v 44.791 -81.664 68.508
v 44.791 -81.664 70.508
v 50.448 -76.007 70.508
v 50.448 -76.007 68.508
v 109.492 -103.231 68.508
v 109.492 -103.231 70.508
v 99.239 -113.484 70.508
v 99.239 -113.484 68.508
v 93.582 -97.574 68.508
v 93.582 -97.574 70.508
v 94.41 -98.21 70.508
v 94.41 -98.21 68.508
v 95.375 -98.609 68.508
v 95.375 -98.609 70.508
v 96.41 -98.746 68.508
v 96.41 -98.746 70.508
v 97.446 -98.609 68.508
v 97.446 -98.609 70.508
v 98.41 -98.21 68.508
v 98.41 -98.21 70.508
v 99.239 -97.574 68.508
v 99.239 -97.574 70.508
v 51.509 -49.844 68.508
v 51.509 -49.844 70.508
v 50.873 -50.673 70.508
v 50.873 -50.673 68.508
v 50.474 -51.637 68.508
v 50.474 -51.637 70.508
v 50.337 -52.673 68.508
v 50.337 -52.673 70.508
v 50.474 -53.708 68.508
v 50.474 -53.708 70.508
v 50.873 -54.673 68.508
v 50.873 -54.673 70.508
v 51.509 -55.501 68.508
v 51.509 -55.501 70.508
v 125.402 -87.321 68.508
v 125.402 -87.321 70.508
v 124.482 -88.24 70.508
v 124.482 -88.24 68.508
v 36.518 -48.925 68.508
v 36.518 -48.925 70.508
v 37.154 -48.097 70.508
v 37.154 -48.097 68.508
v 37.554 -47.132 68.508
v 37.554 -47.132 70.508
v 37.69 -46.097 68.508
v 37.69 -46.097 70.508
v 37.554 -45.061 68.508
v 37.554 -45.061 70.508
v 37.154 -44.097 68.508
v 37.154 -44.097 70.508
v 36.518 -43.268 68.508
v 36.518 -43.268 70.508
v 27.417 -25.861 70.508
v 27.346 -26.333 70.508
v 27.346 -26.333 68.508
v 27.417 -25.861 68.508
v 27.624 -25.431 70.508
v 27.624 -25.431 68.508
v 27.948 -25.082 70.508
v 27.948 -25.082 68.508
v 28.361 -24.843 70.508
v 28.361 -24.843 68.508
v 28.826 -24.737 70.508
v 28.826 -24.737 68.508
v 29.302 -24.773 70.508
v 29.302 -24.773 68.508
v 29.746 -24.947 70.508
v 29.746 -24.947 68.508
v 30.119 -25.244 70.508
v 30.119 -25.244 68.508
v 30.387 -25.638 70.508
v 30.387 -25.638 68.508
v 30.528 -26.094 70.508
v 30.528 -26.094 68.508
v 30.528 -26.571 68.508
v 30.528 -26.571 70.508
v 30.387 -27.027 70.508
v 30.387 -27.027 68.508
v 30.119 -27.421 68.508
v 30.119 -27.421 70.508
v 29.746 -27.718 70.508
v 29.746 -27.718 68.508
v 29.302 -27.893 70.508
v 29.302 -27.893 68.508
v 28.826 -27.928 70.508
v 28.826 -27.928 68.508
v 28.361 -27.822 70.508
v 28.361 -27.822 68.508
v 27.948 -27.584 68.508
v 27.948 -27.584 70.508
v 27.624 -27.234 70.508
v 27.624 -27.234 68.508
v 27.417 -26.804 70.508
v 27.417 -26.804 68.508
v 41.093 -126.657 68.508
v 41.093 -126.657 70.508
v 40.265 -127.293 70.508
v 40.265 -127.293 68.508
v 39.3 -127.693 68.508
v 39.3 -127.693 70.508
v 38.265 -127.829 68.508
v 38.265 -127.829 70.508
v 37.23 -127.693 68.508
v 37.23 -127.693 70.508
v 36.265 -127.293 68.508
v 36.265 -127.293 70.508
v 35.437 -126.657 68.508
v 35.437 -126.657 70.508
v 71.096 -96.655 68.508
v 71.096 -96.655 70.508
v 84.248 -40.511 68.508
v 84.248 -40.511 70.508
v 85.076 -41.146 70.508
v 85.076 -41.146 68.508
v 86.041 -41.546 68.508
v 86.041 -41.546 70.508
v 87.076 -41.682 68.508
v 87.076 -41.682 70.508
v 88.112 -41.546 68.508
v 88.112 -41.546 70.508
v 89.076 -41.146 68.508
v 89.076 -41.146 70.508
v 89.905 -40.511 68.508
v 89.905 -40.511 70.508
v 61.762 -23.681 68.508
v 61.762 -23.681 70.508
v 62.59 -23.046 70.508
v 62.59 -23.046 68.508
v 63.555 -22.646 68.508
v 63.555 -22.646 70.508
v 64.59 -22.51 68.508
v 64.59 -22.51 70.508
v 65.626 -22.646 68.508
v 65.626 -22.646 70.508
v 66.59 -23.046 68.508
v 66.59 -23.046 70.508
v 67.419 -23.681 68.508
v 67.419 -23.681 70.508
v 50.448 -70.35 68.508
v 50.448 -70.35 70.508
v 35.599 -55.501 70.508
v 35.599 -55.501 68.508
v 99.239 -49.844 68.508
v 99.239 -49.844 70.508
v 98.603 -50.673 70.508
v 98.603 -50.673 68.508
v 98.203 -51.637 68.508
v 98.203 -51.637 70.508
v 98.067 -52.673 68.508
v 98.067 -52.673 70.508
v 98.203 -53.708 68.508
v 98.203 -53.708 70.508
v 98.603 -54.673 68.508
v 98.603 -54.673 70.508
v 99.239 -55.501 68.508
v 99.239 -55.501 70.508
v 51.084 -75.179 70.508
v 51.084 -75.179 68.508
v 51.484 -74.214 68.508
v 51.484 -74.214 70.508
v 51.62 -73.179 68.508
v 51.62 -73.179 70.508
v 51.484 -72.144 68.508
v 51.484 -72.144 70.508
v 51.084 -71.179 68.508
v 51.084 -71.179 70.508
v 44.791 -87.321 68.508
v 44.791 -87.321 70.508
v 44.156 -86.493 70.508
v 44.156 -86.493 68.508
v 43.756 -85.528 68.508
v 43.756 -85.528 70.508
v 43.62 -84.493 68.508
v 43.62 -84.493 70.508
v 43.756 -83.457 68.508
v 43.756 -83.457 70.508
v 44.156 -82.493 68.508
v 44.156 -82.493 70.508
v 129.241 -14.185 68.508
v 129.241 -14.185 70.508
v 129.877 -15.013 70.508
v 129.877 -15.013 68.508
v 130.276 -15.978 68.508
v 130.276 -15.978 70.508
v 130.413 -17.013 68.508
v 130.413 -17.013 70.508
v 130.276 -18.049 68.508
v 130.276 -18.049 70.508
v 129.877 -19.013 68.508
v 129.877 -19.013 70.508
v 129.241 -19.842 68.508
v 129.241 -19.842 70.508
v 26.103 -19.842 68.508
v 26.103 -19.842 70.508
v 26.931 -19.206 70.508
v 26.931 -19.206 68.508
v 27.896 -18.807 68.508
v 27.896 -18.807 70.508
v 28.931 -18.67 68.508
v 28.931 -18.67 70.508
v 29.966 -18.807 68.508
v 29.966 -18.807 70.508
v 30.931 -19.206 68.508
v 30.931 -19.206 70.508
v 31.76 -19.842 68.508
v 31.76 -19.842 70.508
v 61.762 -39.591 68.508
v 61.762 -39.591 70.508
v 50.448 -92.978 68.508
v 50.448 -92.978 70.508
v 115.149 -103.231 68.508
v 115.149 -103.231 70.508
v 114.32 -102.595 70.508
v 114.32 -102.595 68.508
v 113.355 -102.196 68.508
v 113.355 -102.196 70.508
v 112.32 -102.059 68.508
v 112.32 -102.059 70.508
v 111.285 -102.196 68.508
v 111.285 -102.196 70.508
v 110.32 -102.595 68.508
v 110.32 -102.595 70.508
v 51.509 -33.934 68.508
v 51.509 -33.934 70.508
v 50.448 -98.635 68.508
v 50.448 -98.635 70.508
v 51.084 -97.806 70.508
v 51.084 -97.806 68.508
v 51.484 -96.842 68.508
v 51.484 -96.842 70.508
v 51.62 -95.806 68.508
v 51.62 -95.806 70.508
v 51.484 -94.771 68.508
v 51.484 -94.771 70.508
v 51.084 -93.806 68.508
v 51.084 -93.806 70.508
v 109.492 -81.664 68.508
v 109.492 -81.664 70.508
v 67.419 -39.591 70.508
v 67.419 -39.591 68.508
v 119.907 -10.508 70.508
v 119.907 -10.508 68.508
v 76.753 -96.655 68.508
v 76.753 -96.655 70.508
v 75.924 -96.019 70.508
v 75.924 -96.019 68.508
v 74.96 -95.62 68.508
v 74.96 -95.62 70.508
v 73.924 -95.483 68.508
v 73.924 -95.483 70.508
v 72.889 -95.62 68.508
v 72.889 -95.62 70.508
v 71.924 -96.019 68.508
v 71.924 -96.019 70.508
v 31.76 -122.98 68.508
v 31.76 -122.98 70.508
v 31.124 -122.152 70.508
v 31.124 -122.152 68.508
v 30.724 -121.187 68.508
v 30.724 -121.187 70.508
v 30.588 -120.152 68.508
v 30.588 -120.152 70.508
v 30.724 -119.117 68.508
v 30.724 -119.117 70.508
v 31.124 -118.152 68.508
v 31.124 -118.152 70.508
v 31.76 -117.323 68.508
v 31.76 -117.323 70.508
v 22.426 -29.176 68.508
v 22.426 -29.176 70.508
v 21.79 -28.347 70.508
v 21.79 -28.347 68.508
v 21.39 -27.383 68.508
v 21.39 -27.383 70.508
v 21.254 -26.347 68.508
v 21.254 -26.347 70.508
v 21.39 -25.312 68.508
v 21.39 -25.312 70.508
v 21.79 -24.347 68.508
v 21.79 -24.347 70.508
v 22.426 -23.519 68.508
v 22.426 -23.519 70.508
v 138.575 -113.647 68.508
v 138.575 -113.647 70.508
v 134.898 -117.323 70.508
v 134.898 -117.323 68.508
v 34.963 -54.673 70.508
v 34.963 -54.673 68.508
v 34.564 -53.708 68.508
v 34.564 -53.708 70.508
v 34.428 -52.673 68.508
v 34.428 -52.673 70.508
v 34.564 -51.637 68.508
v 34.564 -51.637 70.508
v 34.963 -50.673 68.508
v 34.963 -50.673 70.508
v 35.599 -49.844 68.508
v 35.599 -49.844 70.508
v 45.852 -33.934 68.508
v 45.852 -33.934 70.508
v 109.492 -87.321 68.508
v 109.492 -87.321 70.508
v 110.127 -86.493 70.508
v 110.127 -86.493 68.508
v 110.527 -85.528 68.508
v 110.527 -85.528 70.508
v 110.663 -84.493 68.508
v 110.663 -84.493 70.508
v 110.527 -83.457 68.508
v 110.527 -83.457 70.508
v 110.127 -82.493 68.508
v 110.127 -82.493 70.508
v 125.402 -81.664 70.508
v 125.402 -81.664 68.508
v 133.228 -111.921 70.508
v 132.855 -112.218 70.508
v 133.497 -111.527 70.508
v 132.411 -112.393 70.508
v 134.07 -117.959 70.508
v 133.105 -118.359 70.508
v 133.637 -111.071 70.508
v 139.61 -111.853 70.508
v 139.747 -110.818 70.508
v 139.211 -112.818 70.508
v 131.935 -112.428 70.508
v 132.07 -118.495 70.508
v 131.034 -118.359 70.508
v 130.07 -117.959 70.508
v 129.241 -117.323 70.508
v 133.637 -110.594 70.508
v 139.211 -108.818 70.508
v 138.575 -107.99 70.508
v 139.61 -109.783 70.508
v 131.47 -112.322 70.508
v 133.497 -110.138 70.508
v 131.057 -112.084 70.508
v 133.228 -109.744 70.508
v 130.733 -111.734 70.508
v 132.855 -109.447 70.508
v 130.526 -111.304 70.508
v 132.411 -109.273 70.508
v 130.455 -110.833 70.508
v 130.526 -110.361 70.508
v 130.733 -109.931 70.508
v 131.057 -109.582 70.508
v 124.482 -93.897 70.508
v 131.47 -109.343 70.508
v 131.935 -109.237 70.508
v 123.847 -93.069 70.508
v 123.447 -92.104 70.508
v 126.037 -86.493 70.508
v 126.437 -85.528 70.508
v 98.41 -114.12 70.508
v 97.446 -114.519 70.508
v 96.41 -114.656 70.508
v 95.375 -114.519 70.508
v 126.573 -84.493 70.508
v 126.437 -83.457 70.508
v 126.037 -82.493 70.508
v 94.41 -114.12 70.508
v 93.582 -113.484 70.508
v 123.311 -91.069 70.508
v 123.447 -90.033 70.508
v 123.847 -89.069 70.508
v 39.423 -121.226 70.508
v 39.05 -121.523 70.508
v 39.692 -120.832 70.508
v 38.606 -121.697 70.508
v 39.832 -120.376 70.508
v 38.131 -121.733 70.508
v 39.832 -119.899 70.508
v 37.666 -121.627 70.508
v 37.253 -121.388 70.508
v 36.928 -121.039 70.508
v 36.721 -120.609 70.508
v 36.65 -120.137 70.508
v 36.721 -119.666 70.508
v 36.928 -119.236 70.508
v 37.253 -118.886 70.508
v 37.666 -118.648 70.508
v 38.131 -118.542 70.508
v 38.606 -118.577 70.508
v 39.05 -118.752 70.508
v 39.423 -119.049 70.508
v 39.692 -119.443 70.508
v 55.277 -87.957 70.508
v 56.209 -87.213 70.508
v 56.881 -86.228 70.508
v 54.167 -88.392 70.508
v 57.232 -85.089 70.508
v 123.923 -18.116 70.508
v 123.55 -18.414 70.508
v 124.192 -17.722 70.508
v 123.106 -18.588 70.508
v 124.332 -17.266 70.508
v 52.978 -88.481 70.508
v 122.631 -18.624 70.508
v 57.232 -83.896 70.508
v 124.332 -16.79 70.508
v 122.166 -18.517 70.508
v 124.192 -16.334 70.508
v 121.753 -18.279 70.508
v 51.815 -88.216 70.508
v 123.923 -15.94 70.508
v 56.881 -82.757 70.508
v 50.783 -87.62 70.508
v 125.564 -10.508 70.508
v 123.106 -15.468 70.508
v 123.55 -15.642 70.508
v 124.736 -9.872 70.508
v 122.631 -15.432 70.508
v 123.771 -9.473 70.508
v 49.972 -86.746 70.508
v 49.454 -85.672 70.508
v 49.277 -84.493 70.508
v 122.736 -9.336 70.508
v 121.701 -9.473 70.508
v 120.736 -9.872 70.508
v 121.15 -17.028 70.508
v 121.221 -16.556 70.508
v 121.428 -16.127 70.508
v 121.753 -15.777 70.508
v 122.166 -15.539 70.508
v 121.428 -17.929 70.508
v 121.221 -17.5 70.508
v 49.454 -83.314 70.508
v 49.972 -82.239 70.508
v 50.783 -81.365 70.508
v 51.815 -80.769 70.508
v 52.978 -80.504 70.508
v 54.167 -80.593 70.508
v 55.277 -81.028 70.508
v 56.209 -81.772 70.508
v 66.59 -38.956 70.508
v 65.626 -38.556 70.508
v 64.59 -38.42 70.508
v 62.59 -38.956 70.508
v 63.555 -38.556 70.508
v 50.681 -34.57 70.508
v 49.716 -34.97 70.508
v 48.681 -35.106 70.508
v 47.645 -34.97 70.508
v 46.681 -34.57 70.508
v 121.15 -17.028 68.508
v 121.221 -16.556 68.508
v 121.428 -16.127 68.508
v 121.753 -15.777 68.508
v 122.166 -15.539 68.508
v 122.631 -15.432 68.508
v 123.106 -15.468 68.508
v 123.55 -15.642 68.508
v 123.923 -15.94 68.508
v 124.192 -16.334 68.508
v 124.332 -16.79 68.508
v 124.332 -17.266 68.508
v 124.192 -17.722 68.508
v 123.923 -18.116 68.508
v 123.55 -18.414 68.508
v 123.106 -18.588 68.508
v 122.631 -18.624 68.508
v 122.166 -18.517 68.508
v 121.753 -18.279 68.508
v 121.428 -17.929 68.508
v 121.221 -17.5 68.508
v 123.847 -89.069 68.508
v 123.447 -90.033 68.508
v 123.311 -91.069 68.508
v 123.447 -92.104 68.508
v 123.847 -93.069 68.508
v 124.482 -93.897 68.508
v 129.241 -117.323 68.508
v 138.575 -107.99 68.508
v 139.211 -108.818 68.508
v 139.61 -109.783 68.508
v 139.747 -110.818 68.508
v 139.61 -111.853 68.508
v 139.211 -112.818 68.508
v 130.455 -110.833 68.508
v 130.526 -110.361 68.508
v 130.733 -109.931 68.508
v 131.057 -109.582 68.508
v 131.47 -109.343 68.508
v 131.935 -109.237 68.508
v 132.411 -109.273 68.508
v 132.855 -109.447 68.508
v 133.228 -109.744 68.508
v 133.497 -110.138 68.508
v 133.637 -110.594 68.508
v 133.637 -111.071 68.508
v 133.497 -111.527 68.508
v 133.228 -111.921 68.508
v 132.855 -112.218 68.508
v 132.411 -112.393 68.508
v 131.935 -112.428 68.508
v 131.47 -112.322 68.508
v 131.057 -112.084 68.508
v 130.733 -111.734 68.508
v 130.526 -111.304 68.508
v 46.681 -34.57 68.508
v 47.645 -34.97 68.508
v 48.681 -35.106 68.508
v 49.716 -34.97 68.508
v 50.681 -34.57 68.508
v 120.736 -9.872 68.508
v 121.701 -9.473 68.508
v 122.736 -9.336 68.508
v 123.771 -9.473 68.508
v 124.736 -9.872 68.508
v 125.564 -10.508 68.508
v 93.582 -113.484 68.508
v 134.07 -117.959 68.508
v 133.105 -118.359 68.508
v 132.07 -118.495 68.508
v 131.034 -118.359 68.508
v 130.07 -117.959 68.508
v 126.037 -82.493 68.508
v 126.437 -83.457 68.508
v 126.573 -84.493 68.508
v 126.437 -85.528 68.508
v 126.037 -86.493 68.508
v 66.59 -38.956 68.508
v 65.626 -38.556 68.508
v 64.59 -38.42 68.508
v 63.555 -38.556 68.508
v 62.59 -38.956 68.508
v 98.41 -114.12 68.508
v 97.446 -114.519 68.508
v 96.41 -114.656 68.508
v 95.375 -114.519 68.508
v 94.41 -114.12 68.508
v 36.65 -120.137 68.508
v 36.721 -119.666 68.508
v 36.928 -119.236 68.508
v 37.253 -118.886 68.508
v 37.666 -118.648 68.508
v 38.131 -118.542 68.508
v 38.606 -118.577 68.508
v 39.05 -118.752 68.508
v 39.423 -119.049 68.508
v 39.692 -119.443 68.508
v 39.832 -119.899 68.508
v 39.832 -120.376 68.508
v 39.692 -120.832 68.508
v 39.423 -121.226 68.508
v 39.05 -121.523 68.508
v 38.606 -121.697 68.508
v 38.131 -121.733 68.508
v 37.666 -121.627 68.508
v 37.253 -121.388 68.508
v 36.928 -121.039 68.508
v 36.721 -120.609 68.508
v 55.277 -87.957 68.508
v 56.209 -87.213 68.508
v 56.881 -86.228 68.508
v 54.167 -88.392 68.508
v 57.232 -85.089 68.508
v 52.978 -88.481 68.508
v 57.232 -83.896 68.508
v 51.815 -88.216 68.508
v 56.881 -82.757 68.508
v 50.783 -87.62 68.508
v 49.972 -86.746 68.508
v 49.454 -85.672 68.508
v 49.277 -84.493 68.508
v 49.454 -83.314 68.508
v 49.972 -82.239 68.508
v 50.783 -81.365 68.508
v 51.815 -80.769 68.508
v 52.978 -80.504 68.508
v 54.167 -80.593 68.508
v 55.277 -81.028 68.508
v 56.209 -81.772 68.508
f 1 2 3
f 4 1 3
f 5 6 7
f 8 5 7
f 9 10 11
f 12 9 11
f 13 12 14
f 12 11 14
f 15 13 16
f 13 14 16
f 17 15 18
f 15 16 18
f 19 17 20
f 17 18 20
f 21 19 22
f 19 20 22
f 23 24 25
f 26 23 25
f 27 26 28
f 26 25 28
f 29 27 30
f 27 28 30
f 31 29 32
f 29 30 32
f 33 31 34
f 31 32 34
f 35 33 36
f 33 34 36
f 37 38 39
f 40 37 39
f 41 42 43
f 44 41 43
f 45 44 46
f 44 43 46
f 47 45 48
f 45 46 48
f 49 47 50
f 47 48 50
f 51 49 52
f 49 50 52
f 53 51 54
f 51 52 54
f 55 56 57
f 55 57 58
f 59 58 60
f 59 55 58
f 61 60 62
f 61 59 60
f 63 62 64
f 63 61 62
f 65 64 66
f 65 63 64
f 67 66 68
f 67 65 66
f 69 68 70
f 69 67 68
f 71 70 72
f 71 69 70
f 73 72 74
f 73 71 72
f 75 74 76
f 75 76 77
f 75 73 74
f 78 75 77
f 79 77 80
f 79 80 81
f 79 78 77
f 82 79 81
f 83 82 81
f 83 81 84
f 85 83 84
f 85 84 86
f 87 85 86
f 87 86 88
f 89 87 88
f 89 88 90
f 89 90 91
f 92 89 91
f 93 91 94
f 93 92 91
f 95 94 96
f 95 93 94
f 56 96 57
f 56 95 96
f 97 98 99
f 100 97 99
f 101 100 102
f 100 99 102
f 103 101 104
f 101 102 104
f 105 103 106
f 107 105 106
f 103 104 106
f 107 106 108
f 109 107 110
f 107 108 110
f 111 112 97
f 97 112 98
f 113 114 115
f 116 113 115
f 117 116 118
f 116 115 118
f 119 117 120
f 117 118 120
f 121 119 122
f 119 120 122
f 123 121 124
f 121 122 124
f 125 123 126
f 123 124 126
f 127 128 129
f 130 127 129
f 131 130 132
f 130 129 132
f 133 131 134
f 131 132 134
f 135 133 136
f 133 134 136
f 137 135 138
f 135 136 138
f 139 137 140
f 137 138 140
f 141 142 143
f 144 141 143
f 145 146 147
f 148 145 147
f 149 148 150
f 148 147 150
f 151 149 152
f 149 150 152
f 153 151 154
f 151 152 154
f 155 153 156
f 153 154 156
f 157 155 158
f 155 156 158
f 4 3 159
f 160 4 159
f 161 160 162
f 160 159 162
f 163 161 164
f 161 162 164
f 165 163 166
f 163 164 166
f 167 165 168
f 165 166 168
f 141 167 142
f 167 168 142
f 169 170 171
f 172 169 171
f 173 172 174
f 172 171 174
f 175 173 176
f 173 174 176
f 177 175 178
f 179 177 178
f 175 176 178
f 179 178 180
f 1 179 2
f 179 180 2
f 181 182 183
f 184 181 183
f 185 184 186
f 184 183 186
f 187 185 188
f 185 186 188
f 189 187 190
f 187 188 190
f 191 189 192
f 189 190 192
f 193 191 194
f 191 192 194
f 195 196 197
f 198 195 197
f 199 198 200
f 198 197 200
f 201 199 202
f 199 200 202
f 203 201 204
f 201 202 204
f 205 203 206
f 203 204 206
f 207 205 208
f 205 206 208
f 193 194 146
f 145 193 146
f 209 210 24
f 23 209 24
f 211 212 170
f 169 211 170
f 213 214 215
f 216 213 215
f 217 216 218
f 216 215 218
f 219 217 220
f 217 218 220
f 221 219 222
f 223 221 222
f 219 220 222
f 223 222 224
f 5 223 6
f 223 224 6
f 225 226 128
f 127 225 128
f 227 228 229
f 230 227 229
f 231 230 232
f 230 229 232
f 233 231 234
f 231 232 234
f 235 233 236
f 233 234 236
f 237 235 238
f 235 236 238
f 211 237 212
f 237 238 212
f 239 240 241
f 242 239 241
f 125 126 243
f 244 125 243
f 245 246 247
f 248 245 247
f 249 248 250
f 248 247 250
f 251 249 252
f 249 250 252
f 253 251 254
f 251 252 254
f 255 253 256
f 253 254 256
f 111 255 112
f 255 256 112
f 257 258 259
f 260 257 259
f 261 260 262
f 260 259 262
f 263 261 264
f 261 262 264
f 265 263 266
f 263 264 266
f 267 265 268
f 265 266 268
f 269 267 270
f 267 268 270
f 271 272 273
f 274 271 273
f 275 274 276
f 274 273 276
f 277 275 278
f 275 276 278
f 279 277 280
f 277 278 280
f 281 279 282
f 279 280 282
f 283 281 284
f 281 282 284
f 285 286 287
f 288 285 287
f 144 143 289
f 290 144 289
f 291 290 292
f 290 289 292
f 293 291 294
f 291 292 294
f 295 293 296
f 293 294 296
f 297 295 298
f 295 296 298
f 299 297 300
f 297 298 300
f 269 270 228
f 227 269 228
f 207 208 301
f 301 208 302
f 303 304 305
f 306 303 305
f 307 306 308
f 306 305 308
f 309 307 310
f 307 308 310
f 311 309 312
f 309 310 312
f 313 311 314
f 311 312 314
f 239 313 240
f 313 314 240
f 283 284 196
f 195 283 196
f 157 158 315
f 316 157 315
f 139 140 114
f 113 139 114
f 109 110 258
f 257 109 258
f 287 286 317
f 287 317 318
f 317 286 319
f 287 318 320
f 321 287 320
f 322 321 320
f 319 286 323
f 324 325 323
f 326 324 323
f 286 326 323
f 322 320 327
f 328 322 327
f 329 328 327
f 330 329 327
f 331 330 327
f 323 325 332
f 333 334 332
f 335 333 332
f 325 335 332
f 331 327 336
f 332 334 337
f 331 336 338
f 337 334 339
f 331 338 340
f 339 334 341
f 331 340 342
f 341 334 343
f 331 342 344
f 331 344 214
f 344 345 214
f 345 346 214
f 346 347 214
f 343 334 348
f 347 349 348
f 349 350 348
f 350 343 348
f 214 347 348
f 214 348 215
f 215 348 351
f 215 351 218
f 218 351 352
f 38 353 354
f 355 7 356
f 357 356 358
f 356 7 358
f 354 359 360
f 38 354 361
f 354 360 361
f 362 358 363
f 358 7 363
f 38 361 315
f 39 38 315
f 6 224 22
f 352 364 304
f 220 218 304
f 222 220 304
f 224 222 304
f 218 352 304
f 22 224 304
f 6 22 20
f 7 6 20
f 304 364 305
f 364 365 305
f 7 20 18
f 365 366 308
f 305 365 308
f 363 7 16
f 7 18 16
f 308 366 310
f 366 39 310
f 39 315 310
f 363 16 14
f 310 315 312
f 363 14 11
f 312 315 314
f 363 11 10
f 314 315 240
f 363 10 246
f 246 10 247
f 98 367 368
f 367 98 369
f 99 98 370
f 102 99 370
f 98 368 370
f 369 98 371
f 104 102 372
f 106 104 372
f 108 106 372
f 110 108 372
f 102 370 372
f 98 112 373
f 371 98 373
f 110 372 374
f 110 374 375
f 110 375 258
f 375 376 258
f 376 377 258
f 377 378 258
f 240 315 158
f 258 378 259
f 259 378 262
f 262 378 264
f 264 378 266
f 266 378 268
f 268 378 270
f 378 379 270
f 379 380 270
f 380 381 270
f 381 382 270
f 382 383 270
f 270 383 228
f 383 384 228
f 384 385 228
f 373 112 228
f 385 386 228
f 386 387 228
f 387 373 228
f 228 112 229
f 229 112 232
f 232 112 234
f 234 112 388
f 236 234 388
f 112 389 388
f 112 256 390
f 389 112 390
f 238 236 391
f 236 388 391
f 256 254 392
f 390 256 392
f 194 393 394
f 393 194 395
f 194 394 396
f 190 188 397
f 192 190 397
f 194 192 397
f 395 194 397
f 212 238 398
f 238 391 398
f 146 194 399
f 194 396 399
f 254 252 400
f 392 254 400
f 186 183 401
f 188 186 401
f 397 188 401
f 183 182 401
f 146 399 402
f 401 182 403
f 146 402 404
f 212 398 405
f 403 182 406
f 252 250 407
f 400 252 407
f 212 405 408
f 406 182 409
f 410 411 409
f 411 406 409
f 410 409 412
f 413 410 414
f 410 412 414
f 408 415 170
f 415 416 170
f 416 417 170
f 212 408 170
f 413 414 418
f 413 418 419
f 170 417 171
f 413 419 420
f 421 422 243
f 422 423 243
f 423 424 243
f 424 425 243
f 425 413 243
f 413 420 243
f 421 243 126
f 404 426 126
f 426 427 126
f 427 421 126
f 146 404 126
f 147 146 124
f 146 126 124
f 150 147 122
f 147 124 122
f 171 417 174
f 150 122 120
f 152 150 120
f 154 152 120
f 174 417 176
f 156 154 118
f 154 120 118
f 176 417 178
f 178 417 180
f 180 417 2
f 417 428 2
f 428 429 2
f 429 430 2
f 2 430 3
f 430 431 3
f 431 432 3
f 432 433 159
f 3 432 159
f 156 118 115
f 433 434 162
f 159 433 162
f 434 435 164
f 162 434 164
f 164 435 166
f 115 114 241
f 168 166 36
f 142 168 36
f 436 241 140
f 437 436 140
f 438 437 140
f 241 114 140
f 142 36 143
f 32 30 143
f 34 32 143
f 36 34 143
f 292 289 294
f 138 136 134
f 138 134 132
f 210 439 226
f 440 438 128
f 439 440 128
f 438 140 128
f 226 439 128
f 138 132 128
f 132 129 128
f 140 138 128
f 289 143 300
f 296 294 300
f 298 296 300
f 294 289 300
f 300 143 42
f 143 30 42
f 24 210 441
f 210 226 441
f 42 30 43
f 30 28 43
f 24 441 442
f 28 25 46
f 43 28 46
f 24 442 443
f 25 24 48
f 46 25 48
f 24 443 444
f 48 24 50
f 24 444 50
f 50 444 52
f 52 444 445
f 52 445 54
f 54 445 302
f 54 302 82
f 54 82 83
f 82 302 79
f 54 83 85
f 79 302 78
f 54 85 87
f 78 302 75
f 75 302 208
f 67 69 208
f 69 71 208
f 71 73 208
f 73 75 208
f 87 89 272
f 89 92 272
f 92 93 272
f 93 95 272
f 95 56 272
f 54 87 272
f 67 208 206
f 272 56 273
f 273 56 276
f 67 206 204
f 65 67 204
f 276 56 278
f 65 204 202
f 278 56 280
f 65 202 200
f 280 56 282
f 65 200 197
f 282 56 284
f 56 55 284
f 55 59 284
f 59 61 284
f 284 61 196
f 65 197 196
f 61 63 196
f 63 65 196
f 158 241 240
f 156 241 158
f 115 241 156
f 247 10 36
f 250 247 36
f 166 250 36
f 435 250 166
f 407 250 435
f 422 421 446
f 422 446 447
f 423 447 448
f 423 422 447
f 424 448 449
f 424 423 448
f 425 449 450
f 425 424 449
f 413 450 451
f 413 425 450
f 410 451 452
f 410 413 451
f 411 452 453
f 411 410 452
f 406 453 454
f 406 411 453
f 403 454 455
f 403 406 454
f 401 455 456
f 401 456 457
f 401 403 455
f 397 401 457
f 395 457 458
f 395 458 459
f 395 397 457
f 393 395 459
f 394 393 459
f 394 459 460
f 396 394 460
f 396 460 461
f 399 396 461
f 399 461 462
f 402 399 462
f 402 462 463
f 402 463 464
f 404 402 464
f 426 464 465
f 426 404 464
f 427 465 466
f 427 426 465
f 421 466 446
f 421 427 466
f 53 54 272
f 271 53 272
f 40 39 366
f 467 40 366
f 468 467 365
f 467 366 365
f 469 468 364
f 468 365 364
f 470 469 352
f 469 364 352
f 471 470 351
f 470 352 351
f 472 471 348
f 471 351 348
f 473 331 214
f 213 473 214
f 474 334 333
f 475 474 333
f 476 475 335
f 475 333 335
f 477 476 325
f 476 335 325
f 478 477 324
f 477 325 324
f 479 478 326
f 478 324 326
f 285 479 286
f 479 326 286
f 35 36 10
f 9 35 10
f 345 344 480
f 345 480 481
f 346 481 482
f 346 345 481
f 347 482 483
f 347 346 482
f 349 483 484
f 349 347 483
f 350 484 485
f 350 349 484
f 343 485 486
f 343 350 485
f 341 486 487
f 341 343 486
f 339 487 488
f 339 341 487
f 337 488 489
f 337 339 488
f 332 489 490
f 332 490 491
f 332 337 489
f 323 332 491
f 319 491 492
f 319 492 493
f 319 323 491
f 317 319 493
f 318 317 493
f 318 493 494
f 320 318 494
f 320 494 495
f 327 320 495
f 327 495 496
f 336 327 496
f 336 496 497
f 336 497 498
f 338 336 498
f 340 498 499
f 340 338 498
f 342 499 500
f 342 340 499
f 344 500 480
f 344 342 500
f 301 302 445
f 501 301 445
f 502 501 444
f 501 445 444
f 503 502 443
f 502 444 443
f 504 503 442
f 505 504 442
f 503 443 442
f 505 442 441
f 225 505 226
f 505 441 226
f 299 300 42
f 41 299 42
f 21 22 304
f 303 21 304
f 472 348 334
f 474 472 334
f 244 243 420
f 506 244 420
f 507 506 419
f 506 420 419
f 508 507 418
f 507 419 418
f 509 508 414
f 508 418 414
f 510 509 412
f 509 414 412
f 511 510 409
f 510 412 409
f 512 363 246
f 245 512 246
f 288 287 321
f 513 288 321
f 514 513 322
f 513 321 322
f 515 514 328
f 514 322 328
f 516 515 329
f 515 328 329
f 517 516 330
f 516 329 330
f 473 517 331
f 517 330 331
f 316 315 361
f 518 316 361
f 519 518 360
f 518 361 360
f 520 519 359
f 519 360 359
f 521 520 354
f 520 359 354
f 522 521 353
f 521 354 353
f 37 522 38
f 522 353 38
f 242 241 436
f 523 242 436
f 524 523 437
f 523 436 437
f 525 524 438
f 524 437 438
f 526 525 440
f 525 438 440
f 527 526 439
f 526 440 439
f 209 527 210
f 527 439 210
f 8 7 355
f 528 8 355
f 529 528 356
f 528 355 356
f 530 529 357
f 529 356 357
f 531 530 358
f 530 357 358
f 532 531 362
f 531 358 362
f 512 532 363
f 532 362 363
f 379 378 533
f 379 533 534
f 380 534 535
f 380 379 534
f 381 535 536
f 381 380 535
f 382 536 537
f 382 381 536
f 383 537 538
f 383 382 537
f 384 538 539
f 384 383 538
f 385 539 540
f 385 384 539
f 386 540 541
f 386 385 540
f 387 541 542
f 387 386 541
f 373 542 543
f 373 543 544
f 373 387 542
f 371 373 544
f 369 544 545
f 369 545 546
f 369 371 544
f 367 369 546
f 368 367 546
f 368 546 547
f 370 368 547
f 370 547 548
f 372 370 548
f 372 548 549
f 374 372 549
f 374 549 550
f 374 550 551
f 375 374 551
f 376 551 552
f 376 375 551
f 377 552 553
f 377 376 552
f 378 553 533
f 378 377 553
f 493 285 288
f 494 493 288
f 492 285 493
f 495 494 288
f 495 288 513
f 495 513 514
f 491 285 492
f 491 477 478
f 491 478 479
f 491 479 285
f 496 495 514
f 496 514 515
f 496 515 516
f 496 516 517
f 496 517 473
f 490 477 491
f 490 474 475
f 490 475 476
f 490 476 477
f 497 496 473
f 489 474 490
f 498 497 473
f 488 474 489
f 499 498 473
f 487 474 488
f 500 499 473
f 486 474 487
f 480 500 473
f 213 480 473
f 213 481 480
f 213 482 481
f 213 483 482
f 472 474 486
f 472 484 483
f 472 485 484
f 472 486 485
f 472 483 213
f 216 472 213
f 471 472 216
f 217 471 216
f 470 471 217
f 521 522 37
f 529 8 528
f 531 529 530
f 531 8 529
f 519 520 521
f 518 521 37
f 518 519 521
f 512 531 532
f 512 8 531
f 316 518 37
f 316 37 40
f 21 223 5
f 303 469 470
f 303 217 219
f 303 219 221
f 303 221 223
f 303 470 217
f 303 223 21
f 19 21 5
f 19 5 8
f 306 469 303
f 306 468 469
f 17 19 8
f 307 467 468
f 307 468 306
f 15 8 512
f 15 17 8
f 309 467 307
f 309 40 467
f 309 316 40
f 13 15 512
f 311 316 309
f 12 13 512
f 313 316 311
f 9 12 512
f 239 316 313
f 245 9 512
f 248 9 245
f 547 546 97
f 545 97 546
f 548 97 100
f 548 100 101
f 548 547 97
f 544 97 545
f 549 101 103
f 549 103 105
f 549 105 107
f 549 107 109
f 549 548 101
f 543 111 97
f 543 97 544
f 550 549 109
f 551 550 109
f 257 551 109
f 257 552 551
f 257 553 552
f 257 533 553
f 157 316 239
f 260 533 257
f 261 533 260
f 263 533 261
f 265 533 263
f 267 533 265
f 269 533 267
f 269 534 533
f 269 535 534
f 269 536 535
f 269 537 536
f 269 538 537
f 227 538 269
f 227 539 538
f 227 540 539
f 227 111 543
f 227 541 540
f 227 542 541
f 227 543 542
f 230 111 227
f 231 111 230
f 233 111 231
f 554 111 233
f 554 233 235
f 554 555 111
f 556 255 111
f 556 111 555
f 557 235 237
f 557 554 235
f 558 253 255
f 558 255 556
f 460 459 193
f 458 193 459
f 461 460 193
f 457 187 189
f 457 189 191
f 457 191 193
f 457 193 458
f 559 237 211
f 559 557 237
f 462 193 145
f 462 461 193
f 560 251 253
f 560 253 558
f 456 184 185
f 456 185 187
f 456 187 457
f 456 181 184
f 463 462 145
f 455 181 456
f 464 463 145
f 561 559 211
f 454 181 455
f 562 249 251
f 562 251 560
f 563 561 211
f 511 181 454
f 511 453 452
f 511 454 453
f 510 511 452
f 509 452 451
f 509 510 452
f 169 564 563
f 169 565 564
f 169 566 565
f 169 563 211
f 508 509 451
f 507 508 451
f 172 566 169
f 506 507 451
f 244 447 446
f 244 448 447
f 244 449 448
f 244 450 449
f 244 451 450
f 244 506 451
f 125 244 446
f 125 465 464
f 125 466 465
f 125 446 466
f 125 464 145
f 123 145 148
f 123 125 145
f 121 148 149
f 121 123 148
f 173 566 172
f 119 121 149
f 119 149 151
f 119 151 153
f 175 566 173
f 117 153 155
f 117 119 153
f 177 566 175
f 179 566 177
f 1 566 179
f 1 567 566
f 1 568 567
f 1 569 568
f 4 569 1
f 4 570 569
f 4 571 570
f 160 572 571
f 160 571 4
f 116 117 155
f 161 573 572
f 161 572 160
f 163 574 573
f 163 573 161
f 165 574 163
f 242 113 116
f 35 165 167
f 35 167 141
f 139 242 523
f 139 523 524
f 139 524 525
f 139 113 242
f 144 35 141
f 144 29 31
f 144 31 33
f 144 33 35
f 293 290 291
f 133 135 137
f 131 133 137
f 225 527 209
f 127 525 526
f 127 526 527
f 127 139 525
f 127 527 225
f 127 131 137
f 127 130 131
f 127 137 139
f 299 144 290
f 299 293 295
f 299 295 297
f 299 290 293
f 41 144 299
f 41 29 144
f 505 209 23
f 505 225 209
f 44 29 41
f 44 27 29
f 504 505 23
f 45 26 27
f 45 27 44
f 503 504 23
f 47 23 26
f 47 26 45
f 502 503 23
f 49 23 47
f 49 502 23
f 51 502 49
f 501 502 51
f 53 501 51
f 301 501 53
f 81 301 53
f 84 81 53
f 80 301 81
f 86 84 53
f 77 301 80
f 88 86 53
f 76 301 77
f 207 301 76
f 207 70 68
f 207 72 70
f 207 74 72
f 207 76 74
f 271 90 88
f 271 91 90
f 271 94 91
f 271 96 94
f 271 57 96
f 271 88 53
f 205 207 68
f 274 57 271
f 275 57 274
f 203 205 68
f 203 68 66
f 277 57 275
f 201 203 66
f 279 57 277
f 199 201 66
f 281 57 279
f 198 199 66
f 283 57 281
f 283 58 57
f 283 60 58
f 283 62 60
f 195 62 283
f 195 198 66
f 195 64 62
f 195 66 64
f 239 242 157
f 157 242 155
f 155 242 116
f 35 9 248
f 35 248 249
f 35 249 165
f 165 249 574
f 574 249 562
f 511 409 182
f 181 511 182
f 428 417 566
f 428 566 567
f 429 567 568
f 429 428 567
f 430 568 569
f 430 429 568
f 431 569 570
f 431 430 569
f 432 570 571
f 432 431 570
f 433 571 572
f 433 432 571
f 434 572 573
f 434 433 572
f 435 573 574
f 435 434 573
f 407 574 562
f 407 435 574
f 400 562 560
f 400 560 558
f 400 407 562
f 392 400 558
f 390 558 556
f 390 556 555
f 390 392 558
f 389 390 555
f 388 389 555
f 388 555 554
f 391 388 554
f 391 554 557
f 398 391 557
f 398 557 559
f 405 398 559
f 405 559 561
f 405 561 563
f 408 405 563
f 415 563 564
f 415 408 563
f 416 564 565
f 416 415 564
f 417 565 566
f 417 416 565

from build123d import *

# Parameters (mm, degrees)
SKETCH2_R           = 1.6
SKETCH2_R_2         = 4
BOSS_EXTRUDE1_DEPTH = 2


with BuildPart() as part:
    # Sketch2 → Boss-Extrude1 (new body)
    with BuildSketch(Plane(origin=(0, 0, 70.507785861), x_dir=(-1, 0, 0), z_dir=(0, 0, -1))):
        with BuildLine():
            Line((-93.581832429, -113.483945735), (-76.752691037, -96.654804343))
            ThreePointArc((-76.752691037, -96.654804343), (-73.924263912, -95.483231467), (-71.095836788, -96.654804343))
            Line((-71.095836788, -96.654804343), (-41.093354786, -126.657286344))
            ThreePointArc((-41.093354786, -126.657286344), (-38.264927661, -127.828859219), (-35.436500537, -126.657286344))
            Line((-35.436500537, -126.657286344), (-31.759545275, -122.980331082))
            ThreePointArc((-31.759545275, -122.980331082), (-30.587972399, -120.151903957), (-31.759545275, -117.323476832))
            Line((-31.759545275, -117.323476832), (-50.448318777, -98.63470333))
            ThreePointArc((-50.448318777, -98.63470333), (-51.619891652, -95.806276205), (-50.448318777, -92.97784908))
            Line((-50.448318777, -92.97784908), (-44.791464528, -87.320994831))
            ThreePointArc((-44.791464528, -87.320994831), (-43.619891652, -84.492567706), (-44.791464528, -81.664140581))
            Line((-44.791464528, -81.664140581), (-50.448318777, -76.007286332))
            ThreePointArc((-50.448318777, -76.007286332), (-51.619891652, -73.178859207), (-50.448318777, -70.350432082))
            Line((-50.448318777, -70.350432082), (-35.599076372, -55.501189677))
            ThreePointArc((-35.599076372, -55.501189677), (-34.427503497, -52.672762553), (-35.599076372, -49.844335428))
            Line((-35.599076372, -49.844335428), (-36.518315188, -48.925096612))
            ThreePointArc((-36.518315188, -48.925096612), (-37.689888063, -46.096669488), (-36.518315188, -43.268242363))
            Line((-36.518315188, -43.268242363), (-22.425735763, -29.175662938))
            ThreePointArc((-22.425735763, -29.175662938), (-21.254162888, -26.347235813), (-22.425735763, -23.518808689))
            Line((-22.425735763, -23.518808689), (-26.102691025, -19.841853427))
            ThreePointArc((-26.102691025, -19.841853427), (-28.93111815, -18.670280551), (-31.759545275, -19.841853427))
            Line((-31.759545275, -19.841853427), (-45.852124699, -33.934432851))
            ThreePointArc((-45.852124699, -33.934432851), (-48.680551824, -35.106005727), (-51.508978949, -33.934432851))
            Line((-51.508978949, -33.934432851), (-61.762027276, -23.681384524))
            ThreePointArc((-61.762027276, -23.681384524), (-64.590454401, -22.509811649), (-67.418881525, -23.681384524))
            Line((-67.418881525, -23.681384524), (-84.248022918, -40.510525916))
            ThreePointArc((-84.248022918, -40.510525916), (-87.076450042, -41.682098792), (-89.904877167, -40.510525916))
            Line((-89.904877167, -40.510525916), (-119.907359169, -10.508043915))
            ThreePointArc((-119.907359169, -10.508043915), (-122.735786293, -9.33647104), (-125.564213418, -10.508043915))
            Line((-125.564213418, -10.508043915), (-129.24116868, -14.184999177))
            ThreePointArc((-129.24116868, -14.184999177), (-130.412741556, -17.013426302), (-129.24116868, -19.841853427))
            Line((-129.24116868, -19.841853427), (-99.238686679, -49.844335428))
            ThreePointArc((-99.238686679, -49.844335428), (-98.067113804, -52.672762553), (-99.238686679, -55.501189677))
            Line((-99.238686679, -55.501189677), (-125.401637583, -81.664140581))
            ThreePointArc((-125.401637583, -81.664140581), (-126.573210458, -84.492567706), (-125.401637583, -87.320994831))
            Line((-125.401637583, -87.320994831), (-124.482398767, -88.240233646))
            ThreePointArc((-124.482398767, -88.240233646), (-123.310825892, -91.068660771), (-124.482398767, -93.897087896))
            Line((-124.482398767, -93.897087896), (-138.574978192, -107.989667321))
            ThreePointArc((-138.574978192, -107.989667321), (-139.746551067, -110.818094445), (-138.574978192, -113.64652157))
            Line((-138.574978192, -113.64652157), (-134.89802293, -117.323476832))
            ThreePointArc((-134.89802293, -117.323476832), (-132.069595805, -118.495049708), (-129.24116868, -117.323476832))
            Line((-129.24116868, -117.323476832), (-115.148589256, -103.230897408))
            ThreePointArc((-115.148589256, -103.230897408), (-112.320162131, -102.059324532), (-109.491735006, -103.230897408))
            Line((-109.491735006, -103.230897408), (-99.238686679, -113.483945735))
            ThreePointArc((-99.238686679, -113.483945735), (-96.410259554, -114.65551861), (-93.581832429, -113.483945735))
        make_face()
        with Locations((-132.055025121, -110.832665129)):
            Circle(SKETCH2_R, mode=Mode.SUBTRACT)
        with Locations((-28.945688834, -26.332665129)):
            Circle(SKETCH2_R, mode=Mode.SUBTRACT)
        with Locations((-122.750356977, -17.027996986)):
            Circle(SKETCH2_R, mode=Mode.SUBTRACT)
        with Locations((-38.250356977, -120.137333273)):
            Circle(SKETCH2_R, mode=Mode.SUBTRACT)
        with Locations((-53.276745902, -84.492567706)):
            Circle(SKETCH2_R_2, mode=Mode.SUBTRACT)
        with BuildLine():
            Line((-109.491735006, -81.664140581), (-67.418881525, -39.591287101))
            ThreePointArc((-67.418881525, -39.591287101), (-64.590454401, -38.419714226), (-61.762027276, -39.591287101))
            Line((-61.762027276, -39.591287101), (-51.508978949, -49.844335428))
            ThreePointArc((-51.508978949, -49.844335428), (-50.337406074, -52.672762553), (-51.508978949, -55.501189677))
            Line((-51.508978949, -55.501189677), (-93.581832429, -97.574043158))
            ThreePointArc((-93.581832429, -97.574043158), (-96.410259554, -98.745616033), (-99.238686679, -97.574043158))
            Line((-99.238686679, -97.574043158), (-109.491735006, -87.320994831))
            ThreePointArc((-109.491735006, -87.320994831), (-110.663307881, -84.492567706), (-109.491735006, -81.664140581))
        make_face(mode=Mode.SUBTRACT)
    extrude(amount=BOSS_EXTRUDE1_DEPTH)


solid = part.part
